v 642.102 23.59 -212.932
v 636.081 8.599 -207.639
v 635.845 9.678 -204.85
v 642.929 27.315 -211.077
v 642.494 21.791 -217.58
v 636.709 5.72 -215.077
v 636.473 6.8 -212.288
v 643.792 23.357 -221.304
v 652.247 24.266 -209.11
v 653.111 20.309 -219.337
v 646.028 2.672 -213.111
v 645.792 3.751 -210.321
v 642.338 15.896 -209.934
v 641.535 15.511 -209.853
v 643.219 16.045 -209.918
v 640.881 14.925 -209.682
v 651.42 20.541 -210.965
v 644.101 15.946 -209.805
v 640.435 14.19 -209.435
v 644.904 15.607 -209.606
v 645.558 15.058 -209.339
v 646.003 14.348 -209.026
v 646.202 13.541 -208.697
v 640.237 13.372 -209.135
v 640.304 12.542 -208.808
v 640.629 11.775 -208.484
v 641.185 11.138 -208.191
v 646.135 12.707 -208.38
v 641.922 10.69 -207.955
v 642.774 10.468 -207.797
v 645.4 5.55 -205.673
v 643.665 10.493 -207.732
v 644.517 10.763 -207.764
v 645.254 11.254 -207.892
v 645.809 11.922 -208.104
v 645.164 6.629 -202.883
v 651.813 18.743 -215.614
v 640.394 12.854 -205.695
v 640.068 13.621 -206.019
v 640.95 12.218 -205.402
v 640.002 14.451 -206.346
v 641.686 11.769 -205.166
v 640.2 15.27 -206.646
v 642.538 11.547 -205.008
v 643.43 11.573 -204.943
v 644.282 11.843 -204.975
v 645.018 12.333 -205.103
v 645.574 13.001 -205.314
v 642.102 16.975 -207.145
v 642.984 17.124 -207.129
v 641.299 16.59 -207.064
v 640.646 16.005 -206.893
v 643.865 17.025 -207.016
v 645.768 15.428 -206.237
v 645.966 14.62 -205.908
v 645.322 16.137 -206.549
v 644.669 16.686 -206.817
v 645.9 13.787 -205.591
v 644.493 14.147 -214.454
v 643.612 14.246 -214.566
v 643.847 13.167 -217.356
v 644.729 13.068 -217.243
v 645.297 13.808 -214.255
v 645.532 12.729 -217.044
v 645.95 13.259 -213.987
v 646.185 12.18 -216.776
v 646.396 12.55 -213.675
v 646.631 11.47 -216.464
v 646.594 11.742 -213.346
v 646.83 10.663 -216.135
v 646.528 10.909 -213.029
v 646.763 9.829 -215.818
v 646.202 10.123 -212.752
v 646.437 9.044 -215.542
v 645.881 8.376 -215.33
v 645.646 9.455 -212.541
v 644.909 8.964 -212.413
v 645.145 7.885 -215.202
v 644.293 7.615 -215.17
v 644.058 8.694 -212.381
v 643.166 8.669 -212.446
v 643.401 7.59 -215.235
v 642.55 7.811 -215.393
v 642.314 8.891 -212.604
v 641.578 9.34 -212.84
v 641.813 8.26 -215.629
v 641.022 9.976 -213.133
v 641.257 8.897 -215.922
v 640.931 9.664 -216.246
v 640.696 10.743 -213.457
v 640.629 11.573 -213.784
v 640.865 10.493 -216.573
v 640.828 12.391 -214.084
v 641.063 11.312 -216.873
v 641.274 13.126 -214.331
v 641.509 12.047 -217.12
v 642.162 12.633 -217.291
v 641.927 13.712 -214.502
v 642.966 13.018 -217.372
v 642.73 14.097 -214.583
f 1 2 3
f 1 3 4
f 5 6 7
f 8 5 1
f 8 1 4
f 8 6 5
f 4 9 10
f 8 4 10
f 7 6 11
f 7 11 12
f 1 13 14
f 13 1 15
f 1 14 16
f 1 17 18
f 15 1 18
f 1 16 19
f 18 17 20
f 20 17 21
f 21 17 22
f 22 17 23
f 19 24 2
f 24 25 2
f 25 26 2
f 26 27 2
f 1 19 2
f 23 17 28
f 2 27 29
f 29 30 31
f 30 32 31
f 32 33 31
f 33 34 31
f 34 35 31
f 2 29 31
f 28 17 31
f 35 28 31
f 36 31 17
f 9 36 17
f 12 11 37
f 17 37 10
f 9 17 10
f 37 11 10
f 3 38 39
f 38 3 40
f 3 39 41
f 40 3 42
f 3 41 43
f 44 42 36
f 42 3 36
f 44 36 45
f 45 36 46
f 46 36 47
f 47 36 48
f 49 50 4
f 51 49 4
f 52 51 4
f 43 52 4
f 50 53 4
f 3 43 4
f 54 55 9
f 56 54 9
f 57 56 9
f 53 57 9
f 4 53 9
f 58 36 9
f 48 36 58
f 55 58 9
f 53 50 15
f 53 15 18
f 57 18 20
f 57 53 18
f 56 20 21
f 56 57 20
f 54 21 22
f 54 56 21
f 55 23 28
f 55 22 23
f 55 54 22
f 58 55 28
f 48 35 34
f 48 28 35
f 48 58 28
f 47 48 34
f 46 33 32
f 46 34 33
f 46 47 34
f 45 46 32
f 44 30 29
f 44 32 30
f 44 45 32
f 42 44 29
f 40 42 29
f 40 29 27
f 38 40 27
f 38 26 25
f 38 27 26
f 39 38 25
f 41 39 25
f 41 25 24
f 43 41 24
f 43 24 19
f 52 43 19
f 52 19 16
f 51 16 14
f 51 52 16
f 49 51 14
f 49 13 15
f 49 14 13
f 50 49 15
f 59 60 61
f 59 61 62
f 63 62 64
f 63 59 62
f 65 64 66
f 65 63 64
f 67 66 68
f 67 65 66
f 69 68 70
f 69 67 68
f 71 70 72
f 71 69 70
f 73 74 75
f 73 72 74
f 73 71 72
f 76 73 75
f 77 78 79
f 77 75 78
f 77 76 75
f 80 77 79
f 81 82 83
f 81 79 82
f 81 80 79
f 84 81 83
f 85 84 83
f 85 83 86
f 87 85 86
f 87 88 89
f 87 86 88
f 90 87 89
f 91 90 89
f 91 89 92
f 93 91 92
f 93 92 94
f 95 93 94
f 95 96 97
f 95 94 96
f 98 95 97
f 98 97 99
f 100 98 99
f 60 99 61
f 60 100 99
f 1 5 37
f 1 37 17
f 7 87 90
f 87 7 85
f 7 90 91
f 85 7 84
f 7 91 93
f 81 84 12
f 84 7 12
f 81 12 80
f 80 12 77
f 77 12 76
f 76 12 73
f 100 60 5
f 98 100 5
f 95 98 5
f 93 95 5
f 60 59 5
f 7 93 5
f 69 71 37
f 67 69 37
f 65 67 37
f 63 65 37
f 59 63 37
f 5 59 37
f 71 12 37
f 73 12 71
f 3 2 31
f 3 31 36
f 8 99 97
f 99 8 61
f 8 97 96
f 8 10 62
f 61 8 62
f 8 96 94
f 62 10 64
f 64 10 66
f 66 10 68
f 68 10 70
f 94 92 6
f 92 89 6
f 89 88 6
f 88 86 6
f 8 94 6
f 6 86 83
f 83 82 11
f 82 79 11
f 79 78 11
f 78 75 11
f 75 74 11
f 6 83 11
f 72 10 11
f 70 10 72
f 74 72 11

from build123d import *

# Parameters (mm, degrees)
BOSS_EXTRUDE1_DEPTH     = 10
CUT_EXTRUDE1_DEPTH      = 645.694266496
CUT_EXTRUDE1_DEPTH_BACK = 645.694266496
SKETCH3_R               = 3


with BuildPart() as part:
    # Sketch2 → Boss-Extrude1 (new body)
    with BuildSketch(Plane(origin=(707.562217201, 137.847000427, -295.175758868), x_dir=(0.354162422945148, 0.881836565444649, -0.31134105096888115), z_dir=(-0.9318848047050304, 0.30484147230294734, -0.1966275350098222))):
        Polygon((-166.545846492, -35.496085413), (-149.545846492, -35.496085413), (-149.545846492, -40.496085413), (-166.545846492, -40.496085413), (-166.545846492, -43.496085413), (-146.545846492, -43.496085413), (-146.545846492, -32.496085413), (-166.545846492, -32.496085413), align=None)
    extrude(amount=BOSS_EXTRUDE1_DEPTH)

    # Sketch3 → Cut-Extrude1 (cut, two sides: drawn at the far end of the back side and taken through both)
    with BuildSketch(Plane(origin=(18.826454002, -86.301151934, -223.021951761), x_dir=(-0.9969153981489656, -0.02832360582342947, -0.07319468755755801), z_dir=(0.07848368577920857, -0.35977207869560485, -0.9297334900161196)).offset(-CUT_EXTRUDE1_DEPTH_BACK)):
        with Locations(Location((-626.324876441, 87.720012572, 0), (0, 0, 90))):
            Circle(SKETCH3_R)
    extrude(amount=CUT_EXTRUDE1_DEPTH + CUT_EXTRUDE1_DEPTH_BACK, mode=Mode.SUBTRACT)


solid = part.part
